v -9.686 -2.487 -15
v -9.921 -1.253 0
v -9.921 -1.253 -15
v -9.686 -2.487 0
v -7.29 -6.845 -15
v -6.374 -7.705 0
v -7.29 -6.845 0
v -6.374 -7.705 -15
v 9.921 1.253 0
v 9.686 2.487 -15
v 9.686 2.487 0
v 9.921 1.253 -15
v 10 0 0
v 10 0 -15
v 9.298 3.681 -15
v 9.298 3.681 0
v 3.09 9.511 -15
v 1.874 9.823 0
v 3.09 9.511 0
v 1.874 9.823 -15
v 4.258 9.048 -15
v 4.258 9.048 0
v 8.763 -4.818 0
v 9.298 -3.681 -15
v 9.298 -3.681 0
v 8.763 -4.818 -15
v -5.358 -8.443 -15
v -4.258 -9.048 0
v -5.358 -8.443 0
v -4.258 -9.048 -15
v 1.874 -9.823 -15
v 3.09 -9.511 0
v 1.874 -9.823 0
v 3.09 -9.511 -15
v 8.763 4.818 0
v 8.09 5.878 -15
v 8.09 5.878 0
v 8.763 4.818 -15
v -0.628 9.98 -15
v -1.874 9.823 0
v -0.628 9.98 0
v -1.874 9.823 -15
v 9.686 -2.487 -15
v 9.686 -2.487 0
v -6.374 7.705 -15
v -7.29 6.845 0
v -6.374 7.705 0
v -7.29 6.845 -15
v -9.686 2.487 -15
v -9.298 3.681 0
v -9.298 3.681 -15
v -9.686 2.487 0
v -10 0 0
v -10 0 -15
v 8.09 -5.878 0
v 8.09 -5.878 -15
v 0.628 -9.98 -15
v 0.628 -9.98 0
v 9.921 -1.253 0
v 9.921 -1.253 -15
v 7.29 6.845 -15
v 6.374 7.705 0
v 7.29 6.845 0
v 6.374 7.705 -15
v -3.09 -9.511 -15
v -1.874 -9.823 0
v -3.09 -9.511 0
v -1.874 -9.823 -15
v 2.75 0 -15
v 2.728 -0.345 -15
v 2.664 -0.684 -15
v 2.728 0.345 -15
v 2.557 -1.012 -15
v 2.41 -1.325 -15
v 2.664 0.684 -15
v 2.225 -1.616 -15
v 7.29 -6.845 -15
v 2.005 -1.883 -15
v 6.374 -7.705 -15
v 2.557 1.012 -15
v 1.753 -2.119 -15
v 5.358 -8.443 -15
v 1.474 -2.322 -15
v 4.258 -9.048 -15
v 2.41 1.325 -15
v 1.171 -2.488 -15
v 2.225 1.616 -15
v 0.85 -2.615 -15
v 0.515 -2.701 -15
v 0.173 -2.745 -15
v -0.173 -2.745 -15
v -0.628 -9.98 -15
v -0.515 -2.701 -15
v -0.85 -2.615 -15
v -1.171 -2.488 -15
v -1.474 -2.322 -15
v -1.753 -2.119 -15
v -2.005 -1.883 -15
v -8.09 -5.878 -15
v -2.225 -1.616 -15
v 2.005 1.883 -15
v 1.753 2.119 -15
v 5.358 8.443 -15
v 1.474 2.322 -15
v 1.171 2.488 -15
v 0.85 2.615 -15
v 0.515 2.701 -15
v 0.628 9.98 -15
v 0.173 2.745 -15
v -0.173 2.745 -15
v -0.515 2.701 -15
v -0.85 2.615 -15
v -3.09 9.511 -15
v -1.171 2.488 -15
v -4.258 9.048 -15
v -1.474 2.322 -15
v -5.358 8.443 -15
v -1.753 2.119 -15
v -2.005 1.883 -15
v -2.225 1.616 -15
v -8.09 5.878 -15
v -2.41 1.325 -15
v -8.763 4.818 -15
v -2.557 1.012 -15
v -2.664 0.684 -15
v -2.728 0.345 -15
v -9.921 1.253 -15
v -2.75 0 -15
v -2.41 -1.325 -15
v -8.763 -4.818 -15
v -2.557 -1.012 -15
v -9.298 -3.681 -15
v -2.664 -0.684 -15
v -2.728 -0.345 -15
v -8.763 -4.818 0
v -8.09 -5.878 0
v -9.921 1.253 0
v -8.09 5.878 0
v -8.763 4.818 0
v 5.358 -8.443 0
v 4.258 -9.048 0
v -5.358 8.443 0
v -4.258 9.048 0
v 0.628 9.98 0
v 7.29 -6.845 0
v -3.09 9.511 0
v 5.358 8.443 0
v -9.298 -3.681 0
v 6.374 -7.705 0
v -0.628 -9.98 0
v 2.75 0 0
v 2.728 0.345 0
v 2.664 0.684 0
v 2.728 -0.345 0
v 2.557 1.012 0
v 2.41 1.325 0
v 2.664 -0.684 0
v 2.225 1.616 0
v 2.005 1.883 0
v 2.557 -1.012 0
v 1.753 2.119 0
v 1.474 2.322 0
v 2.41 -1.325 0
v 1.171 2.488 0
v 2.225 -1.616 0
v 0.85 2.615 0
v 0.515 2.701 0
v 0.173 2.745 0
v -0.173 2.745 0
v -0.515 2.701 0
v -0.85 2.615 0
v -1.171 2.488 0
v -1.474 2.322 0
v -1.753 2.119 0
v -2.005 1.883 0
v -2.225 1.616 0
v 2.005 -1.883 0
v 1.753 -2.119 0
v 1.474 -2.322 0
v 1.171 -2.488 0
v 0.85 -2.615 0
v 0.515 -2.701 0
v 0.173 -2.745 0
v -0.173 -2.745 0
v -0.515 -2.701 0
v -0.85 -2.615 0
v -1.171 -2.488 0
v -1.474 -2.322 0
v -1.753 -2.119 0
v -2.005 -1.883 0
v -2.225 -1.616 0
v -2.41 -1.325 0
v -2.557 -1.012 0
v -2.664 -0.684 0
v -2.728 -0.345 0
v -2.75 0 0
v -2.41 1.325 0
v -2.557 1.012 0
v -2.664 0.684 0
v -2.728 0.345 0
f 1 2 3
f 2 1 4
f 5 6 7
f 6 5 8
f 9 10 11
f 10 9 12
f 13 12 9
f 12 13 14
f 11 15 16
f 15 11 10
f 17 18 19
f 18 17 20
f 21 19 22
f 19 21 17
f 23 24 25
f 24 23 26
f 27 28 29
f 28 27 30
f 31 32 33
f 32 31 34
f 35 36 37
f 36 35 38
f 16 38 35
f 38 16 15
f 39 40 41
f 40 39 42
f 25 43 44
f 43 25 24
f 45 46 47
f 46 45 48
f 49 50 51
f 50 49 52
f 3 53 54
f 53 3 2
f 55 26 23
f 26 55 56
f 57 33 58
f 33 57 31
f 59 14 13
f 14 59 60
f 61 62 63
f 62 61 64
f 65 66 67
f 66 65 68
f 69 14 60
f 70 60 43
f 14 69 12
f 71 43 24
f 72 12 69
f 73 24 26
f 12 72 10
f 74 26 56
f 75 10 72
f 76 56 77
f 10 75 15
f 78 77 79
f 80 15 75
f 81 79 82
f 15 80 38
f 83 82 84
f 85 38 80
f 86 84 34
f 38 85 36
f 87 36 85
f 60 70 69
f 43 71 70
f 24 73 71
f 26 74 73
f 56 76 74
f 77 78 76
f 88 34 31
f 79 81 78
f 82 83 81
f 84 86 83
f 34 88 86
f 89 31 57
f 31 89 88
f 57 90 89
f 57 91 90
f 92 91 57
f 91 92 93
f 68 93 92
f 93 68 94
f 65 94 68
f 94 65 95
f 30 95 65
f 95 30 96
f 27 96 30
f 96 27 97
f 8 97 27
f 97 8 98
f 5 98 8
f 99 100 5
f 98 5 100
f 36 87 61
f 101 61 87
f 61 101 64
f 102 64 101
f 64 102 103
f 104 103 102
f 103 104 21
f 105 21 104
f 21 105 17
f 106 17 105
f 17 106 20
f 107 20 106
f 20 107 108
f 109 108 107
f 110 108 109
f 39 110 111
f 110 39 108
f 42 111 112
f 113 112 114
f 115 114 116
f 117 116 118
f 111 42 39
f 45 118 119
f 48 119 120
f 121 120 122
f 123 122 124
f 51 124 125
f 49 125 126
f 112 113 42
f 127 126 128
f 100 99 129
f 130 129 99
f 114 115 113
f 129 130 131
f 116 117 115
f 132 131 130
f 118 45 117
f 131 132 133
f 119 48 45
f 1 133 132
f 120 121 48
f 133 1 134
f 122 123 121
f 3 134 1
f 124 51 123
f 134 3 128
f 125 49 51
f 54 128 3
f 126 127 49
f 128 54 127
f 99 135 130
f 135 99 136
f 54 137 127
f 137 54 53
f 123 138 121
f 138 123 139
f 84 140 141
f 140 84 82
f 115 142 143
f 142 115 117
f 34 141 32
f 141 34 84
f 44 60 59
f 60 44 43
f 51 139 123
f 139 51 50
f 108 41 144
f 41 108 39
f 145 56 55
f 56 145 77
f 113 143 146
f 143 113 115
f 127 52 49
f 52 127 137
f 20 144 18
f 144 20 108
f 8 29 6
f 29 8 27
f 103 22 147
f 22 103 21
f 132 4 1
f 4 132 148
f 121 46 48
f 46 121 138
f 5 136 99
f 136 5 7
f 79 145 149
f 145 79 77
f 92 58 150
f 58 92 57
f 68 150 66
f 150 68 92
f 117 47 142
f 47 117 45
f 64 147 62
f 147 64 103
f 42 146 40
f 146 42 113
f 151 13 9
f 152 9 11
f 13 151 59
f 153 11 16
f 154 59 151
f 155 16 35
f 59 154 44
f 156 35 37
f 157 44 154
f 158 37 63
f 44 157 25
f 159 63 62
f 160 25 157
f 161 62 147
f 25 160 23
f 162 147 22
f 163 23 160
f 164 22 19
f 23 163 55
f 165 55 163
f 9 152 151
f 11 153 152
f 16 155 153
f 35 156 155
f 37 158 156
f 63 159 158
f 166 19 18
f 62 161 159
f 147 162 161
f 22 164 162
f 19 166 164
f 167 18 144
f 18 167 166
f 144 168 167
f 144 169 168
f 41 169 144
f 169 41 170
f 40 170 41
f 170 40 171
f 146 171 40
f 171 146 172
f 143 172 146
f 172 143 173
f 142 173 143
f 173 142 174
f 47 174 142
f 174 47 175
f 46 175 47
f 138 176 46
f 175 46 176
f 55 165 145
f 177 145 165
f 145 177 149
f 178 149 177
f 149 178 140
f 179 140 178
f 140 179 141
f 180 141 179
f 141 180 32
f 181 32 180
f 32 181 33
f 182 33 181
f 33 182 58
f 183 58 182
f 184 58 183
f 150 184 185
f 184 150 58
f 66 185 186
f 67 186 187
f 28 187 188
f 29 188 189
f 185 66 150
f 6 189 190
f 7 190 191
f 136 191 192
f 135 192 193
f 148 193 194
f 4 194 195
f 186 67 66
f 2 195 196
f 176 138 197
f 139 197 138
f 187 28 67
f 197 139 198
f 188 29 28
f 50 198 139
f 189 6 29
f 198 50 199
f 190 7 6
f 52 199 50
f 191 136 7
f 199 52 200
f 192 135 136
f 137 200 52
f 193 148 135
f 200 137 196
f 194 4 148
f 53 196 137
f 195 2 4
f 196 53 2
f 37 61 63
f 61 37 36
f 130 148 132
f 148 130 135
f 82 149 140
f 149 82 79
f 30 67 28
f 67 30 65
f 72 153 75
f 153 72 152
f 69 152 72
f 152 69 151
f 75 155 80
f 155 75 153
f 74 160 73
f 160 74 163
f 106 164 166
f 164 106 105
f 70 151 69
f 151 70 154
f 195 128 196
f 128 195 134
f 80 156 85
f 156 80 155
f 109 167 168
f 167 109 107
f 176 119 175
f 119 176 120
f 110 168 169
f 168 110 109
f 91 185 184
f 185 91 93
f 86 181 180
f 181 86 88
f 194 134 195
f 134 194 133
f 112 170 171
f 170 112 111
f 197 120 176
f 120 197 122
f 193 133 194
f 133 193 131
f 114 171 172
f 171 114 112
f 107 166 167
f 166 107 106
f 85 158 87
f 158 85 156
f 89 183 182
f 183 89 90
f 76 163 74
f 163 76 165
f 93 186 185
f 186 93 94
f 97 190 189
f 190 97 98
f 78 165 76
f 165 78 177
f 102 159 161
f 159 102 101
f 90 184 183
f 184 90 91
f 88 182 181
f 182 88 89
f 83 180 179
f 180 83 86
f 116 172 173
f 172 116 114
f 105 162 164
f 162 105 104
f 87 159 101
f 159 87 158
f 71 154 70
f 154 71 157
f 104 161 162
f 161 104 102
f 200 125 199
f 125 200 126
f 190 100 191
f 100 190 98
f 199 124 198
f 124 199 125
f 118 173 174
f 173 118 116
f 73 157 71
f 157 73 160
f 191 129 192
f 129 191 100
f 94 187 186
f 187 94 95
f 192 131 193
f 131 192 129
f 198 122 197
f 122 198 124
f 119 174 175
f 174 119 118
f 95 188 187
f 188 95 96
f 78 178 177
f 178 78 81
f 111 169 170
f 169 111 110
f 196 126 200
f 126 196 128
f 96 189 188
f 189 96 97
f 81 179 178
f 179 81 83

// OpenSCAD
$fn = 50;


difference() {
	union() {
		translate(v = [0, 0, -15.0000000000]) {
			cylinder(h = 15, r = 10.0000000000);
		}
	}
	union() {
		#translate(v = [0, 0, -15]) {
			cylinder(h = 15, r = 2.7500000000);
		}
	}
}
